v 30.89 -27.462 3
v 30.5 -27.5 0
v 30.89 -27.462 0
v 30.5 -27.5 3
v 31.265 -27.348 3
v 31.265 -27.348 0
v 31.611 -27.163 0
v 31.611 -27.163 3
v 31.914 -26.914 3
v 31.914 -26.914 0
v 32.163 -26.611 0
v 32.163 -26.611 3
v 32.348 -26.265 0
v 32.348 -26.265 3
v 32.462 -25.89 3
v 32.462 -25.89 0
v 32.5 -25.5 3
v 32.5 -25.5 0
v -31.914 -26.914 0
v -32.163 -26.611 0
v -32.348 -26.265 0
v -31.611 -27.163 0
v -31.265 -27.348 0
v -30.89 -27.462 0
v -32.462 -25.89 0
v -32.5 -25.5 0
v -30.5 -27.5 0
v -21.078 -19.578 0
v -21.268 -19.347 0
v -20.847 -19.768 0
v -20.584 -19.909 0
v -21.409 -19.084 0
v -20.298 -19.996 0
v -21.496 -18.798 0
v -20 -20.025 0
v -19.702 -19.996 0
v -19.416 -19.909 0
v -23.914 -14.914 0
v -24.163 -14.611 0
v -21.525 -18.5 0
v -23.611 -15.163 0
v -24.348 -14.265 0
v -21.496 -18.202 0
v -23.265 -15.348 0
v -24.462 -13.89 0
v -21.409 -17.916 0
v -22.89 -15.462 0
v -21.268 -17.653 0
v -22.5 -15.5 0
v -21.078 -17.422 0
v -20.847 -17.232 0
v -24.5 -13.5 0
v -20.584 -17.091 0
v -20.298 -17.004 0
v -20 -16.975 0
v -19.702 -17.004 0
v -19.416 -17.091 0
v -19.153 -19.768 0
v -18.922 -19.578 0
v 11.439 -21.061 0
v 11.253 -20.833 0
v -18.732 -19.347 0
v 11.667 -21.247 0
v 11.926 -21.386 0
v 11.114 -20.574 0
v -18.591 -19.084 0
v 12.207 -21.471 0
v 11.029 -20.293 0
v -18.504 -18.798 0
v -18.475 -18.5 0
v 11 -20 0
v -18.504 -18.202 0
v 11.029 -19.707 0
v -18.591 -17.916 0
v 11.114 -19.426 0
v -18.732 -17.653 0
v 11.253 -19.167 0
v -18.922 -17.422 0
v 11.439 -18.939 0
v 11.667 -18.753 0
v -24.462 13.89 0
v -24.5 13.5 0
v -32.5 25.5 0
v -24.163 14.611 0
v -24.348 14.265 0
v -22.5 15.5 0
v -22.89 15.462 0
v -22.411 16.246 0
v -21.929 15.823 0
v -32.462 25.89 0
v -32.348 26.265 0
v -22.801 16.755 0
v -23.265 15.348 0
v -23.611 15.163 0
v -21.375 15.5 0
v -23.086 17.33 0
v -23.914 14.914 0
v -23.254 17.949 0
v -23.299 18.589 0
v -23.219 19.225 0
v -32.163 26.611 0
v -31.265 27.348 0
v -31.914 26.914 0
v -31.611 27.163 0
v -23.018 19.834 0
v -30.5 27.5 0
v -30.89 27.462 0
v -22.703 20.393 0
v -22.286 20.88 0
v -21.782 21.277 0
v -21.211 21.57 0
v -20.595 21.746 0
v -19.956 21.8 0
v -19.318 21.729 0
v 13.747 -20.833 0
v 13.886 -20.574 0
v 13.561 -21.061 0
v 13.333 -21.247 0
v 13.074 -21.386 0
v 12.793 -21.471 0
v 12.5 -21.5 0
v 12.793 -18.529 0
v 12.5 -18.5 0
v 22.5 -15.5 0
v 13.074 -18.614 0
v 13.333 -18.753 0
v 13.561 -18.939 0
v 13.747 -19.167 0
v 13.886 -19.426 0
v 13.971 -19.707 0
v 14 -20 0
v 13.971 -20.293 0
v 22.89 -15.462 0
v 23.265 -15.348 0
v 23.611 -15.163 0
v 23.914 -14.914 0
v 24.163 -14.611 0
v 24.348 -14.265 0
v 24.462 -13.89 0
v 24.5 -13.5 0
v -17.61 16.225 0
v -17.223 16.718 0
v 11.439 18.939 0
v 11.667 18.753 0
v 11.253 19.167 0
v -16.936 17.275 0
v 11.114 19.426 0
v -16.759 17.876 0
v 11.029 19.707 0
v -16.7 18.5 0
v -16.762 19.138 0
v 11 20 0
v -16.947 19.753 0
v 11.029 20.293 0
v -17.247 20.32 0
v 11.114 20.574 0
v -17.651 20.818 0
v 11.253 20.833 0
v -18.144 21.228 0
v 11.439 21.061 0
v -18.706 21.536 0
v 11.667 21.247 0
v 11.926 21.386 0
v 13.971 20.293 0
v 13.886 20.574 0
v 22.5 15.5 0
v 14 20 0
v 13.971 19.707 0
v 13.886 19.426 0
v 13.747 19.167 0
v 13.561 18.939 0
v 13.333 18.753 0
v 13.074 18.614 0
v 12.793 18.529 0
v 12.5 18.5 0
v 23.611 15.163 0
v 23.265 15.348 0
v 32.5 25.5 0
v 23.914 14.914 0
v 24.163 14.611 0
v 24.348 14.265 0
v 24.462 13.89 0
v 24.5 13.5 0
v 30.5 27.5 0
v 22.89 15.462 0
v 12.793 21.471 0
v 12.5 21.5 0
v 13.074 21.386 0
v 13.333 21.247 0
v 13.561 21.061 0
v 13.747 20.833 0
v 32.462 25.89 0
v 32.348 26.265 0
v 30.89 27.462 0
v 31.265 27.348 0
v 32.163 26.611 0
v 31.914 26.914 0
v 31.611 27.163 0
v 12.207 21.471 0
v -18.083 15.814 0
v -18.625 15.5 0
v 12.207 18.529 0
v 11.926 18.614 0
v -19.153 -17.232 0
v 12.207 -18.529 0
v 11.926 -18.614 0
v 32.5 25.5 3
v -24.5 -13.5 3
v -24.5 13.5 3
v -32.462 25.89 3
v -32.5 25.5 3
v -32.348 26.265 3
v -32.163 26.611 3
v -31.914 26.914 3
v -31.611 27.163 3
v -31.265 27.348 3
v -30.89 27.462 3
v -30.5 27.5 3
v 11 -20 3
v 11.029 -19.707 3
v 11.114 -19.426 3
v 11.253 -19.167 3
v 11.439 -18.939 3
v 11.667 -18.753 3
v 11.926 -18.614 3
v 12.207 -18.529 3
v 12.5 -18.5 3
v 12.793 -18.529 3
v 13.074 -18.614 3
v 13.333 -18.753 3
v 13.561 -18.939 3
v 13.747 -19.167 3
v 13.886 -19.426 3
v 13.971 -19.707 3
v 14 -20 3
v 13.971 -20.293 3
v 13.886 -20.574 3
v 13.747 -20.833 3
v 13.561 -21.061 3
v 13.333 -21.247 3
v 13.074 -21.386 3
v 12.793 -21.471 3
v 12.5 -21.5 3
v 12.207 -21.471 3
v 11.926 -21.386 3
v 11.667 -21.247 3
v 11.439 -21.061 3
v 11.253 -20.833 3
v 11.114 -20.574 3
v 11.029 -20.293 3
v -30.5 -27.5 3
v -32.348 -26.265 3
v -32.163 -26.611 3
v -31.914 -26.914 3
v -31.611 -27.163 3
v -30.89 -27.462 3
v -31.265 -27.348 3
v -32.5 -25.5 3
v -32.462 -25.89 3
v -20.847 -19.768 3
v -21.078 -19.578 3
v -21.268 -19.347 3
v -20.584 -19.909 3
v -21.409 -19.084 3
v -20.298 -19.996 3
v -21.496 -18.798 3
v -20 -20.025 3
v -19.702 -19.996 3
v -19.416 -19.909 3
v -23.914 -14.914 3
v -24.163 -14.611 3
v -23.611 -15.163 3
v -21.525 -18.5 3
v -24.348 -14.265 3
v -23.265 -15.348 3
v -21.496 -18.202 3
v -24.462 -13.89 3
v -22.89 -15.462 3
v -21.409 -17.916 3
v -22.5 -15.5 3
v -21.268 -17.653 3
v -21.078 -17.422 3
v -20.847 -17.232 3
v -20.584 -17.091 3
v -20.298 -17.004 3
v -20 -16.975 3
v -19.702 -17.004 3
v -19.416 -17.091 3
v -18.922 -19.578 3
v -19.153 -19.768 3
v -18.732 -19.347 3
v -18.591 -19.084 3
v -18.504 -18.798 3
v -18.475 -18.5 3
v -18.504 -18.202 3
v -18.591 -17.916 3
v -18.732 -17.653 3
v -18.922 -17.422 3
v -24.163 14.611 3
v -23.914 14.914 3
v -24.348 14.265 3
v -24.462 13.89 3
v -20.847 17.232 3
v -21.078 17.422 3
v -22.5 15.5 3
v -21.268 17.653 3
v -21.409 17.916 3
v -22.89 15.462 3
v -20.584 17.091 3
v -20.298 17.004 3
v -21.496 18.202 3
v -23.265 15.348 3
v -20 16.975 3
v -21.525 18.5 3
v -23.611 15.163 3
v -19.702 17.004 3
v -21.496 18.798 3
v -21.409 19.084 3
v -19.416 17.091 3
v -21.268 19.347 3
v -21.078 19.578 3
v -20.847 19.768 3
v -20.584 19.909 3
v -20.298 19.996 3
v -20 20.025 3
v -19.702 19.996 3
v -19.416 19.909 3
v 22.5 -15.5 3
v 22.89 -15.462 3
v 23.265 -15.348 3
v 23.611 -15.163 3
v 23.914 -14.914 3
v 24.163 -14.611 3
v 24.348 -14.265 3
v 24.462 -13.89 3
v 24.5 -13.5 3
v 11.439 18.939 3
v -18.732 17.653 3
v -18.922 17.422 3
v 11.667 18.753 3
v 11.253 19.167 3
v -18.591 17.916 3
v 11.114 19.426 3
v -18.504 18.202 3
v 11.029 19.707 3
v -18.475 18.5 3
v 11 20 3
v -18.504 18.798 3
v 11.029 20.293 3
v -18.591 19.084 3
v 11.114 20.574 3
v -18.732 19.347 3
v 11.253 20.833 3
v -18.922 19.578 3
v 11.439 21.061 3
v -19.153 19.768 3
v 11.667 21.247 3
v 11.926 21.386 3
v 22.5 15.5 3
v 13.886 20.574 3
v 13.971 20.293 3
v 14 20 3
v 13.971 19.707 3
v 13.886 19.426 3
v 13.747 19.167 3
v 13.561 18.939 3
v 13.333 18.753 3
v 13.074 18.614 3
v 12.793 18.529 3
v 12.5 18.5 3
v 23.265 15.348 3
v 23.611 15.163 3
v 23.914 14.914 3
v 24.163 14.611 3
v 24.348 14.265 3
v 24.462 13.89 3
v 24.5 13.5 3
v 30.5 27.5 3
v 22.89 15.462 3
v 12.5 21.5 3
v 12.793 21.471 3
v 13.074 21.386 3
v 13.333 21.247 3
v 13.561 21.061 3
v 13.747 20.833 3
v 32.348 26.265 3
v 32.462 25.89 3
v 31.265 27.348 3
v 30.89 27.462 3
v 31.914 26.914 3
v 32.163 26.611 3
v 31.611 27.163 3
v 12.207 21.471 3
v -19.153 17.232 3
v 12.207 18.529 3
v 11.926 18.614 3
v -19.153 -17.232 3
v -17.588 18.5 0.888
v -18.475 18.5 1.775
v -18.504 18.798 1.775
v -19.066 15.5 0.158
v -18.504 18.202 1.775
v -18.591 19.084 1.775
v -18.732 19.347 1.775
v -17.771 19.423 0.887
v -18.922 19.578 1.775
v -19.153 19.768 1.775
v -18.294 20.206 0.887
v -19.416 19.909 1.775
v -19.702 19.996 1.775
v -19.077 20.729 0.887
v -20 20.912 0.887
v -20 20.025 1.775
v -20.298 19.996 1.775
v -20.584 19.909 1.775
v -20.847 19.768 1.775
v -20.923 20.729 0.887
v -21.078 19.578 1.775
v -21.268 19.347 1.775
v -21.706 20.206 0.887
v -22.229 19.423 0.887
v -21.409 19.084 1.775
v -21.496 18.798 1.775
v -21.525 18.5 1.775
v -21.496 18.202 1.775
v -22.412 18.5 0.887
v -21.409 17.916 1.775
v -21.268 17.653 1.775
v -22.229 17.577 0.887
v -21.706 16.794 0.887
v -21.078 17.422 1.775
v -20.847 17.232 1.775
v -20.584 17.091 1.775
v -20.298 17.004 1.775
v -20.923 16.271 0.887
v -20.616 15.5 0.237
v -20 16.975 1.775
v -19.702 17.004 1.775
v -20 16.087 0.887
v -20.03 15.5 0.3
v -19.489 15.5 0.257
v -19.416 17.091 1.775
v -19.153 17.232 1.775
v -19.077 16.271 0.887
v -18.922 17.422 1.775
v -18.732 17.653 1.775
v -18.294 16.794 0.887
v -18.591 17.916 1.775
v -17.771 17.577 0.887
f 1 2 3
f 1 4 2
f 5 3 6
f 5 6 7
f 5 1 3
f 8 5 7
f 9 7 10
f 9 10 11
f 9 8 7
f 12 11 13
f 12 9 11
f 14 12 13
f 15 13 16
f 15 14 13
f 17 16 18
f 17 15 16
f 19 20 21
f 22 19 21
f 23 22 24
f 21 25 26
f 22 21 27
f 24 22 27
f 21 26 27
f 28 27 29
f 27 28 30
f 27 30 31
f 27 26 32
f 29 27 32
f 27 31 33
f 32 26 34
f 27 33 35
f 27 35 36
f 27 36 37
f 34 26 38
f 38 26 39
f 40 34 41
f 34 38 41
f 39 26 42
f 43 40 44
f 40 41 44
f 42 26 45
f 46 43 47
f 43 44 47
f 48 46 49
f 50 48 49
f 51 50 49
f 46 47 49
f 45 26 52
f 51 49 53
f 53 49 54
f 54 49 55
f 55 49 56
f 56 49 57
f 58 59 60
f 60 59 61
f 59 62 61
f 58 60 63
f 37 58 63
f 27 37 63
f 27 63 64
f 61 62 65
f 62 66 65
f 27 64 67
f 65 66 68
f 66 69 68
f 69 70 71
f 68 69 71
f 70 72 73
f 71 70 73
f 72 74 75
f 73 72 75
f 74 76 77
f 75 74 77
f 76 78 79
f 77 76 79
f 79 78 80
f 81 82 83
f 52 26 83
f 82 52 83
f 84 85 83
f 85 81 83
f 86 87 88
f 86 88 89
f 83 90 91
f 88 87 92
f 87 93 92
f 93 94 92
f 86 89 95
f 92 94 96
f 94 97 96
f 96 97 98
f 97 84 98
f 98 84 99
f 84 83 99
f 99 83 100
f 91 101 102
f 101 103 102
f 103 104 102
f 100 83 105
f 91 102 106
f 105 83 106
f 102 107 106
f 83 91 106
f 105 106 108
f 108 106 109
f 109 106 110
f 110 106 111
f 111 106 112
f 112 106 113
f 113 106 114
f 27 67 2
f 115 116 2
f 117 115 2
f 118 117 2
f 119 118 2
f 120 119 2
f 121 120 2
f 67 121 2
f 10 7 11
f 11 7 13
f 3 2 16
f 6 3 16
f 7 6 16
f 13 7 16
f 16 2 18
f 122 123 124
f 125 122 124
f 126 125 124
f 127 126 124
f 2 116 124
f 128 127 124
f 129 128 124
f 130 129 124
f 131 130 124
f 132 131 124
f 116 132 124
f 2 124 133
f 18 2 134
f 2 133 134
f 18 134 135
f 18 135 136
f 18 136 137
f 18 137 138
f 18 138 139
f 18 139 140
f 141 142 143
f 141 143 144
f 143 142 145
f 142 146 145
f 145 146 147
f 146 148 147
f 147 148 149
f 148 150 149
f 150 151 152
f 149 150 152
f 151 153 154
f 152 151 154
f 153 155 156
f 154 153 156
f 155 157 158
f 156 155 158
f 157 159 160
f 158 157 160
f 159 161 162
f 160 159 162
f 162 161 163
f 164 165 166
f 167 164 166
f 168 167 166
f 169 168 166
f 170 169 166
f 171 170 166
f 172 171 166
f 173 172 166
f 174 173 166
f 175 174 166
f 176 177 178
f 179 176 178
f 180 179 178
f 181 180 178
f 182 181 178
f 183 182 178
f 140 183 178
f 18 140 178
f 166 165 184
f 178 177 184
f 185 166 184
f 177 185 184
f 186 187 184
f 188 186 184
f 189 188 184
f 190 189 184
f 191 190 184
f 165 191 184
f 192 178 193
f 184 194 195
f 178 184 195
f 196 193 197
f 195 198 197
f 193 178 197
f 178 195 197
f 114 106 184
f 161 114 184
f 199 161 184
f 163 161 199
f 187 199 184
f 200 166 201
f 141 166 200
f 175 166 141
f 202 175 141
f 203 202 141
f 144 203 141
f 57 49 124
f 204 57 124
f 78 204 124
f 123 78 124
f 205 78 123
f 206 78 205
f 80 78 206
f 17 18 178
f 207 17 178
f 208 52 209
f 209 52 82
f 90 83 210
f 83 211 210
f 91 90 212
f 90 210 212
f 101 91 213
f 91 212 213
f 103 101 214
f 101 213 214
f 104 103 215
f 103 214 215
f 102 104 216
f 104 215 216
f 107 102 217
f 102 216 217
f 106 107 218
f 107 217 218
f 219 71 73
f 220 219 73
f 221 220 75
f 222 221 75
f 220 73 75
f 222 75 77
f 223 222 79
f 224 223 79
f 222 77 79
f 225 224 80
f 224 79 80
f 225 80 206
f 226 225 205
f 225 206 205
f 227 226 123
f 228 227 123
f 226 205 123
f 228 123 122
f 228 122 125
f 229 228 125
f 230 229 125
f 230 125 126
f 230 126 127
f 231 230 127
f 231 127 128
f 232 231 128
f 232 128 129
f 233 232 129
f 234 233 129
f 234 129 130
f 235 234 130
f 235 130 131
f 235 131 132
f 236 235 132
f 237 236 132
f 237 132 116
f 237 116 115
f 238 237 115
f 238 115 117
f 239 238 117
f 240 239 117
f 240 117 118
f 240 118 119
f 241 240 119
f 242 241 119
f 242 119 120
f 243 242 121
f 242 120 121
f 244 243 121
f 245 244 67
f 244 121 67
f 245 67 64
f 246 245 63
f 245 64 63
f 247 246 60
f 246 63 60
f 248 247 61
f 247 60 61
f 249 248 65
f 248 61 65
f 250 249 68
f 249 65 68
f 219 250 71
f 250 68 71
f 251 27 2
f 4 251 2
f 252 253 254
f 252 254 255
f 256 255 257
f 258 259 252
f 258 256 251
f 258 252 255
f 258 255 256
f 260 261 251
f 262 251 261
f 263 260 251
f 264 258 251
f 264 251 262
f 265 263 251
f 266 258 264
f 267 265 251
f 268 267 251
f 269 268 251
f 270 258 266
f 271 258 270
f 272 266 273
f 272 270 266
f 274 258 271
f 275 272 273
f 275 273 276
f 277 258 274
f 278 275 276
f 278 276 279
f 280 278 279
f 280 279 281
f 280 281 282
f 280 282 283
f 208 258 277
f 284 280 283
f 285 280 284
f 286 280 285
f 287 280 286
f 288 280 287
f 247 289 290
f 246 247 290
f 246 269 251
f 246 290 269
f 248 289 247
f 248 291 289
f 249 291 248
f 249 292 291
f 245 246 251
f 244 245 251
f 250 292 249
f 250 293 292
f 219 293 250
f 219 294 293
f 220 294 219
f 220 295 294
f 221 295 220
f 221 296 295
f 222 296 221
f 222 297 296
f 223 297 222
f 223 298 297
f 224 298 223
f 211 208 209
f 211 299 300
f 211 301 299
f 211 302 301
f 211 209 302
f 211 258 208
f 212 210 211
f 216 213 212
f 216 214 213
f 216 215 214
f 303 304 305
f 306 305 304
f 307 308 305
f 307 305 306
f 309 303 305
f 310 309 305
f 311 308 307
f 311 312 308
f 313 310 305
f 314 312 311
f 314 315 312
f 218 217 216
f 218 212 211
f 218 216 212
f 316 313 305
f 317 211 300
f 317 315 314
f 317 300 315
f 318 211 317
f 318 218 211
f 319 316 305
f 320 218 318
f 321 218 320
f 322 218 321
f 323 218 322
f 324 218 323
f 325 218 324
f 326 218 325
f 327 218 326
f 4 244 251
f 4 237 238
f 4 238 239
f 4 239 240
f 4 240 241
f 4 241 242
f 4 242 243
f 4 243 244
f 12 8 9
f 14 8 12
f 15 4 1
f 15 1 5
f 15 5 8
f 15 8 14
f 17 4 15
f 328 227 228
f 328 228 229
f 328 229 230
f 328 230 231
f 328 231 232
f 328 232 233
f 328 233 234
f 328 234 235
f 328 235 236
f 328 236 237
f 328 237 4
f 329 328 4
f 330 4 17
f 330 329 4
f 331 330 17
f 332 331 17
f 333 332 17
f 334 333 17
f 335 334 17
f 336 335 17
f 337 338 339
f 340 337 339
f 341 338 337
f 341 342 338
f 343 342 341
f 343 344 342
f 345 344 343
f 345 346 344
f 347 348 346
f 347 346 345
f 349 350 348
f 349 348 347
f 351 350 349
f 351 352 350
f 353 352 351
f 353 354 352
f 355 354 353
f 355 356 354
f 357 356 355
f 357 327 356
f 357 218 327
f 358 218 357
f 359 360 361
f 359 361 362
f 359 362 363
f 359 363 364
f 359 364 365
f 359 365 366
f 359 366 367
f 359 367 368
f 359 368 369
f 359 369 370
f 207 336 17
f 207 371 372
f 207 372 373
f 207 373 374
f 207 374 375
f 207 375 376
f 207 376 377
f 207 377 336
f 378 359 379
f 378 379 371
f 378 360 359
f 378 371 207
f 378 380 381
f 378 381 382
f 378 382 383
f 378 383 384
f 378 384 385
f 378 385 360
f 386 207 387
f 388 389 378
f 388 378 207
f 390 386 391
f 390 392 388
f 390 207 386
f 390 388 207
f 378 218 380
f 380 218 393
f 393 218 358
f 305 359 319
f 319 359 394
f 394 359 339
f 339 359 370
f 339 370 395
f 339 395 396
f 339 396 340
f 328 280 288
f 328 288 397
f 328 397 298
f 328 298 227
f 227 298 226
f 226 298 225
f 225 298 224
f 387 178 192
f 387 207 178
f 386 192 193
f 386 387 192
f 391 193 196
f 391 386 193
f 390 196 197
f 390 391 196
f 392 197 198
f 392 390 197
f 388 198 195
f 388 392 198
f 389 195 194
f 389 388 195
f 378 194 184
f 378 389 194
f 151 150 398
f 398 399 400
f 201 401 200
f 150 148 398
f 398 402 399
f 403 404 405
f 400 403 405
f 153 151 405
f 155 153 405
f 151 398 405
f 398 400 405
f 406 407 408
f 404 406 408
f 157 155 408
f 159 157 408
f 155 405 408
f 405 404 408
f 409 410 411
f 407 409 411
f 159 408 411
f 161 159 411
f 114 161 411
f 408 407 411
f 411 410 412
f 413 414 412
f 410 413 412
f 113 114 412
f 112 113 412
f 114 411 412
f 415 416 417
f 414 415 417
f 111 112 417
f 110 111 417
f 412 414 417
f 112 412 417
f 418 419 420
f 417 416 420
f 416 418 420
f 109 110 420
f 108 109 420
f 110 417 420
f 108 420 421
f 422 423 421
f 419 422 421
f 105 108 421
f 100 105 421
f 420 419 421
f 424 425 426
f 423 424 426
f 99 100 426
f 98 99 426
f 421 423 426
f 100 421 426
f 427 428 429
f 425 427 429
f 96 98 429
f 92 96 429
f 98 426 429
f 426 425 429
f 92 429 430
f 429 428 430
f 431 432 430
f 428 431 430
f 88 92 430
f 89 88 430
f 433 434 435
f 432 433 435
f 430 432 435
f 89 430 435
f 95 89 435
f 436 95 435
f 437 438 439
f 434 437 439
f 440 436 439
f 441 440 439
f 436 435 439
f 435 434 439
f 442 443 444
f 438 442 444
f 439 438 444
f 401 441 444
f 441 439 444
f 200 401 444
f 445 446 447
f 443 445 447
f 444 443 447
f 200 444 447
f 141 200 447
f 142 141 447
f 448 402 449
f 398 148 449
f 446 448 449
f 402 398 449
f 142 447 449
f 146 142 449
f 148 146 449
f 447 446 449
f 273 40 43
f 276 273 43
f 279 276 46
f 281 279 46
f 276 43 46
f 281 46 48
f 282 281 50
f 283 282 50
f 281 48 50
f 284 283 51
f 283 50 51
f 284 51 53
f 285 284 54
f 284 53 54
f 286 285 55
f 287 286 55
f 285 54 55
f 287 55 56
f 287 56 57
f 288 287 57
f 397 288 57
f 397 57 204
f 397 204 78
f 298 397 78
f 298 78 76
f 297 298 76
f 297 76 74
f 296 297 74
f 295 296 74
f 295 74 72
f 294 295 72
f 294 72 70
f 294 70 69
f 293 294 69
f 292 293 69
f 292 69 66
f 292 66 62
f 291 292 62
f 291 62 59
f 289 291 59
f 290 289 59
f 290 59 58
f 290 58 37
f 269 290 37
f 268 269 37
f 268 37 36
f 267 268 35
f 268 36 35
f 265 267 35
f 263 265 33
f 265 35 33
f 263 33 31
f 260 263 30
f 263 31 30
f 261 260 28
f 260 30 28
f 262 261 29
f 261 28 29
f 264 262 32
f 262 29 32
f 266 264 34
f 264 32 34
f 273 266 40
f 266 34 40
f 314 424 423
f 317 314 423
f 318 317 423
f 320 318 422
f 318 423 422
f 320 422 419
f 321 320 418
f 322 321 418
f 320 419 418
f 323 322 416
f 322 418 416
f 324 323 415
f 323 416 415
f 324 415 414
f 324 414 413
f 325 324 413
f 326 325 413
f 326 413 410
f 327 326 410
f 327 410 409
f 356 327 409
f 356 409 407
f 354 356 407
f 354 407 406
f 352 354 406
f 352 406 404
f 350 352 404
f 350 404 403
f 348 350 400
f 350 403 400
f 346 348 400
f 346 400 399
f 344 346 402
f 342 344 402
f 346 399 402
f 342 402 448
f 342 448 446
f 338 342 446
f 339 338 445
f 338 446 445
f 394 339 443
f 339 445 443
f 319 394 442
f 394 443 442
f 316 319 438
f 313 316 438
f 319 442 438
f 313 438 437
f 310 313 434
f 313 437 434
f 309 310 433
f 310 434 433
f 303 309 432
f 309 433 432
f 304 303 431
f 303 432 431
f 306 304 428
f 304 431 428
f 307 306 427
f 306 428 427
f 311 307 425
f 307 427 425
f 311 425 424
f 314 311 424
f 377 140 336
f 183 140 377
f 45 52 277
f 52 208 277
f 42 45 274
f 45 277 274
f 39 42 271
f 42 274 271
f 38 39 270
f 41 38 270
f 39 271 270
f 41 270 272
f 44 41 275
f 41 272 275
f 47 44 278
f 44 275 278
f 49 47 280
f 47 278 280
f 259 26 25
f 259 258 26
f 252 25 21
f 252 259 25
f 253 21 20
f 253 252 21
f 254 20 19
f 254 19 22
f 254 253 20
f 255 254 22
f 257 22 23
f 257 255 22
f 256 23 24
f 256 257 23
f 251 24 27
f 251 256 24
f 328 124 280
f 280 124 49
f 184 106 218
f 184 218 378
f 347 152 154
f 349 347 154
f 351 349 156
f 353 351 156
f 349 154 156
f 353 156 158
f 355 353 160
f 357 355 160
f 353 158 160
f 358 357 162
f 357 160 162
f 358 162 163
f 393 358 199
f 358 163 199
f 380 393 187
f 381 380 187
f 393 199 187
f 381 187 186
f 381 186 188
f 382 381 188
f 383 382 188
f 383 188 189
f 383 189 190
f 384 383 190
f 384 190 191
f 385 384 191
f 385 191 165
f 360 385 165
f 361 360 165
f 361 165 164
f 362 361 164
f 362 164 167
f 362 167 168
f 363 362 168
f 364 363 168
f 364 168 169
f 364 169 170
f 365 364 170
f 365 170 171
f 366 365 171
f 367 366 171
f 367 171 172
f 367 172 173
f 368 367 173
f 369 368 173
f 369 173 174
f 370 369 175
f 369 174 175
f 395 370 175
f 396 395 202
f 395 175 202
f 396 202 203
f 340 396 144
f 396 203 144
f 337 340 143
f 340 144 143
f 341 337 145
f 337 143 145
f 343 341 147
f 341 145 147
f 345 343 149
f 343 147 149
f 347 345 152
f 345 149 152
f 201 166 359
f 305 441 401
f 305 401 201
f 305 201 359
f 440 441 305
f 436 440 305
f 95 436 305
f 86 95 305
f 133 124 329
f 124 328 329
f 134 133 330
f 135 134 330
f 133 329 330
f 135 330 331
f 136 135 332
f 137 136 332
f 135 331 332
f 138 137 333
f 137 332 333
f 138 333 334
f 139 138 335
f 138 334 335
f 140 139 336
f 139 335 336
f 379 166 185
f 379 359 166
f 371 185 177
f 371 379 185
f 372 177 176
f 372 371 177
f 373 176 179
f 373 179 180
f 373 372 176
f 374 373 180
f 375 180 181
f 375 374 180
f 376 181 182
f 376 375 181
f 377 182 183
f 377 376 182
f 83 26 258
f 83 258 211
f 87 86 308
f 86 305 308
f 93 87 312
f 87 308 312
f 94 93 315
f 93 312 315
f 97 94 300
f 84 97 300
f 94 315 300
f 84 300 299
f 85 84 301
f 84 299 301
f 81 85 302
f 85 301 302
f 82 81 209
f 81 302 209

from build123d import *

# Parameters (mm, degrees)
SKETCH_1_W                   = 65
SKETCH_1_H                   = 55
EXTRUDE_1_DEPTH              = 3
FILLET_1_R                   = 2
SKETCH_2_R                   = 1.525
CUT_EXTRUDE_1_DEPTH          = 6
HOLE_WIZARD_M3_1_D           = 3
HOLE_WIZARD_M3_1_DEPTH       = 7.25
HOLE_WIZARD_M3_1_CSINK_D     = 6.6
HOLE_WIZARD_M3_1_CSINK_ANGLE = 90
HOLE_WIZARD_M3_1_TIP         = 0.901290929
SKETCH_9_R                   = 1.5
CUT_EXTRUDE_3_DEPTH          = 10
SKETCH_13_W                  = 49
SKETCH_13_H                  = 31
CUT_EXTRUDE_8_DEPTH          = 10
FILLET_5_R                   = 2


with BuildPart() as part:
    # 草图1 → 凸台-拉伸1 (new body)
    with BuildSketch(Plane.XY):
        Rectangle(SKETCH_1_W, SKETCH_1_H)
    extrude(amount=EXTRUDE_1_DEPTH)

    # 圆角1
    fillet_1_edges = [part.edges().sort_by_distance(p)[0] for p in [
        (32.5, -27.5, 1.5),
        (-32.5, -27.5, 1.5),
        (-32.5, 27.5, 1.5),
        (32.5, 27.5, 1.5),
    ]]
    fillet(fillet_1_edges, radius=FILLET_1_R)

    # 草图2 → 切除-拉伸1 (cut)
    with BuildSketch(Plane(origin=(0, 0, 0), x_dir=(-1, 0, 0), z_dir=(0, 0, -1))):
        with Locations((20, -18.5)):
            Circle(SKETCH_2_R)
        with Locations((20, 18.5)):
            Circle(SKETCH_2_R)
    extrude(amount=-CUT_EXTRUDE_1_DEPTH, mode=Mode.SUBTRACT)

    # M3 十字槽沉头木螺钉的锥形沉头孔1
    with Locations(Plane(origin=(0, 0, 0), x_dir=(-1, 0, 0), z_dir=(0, 0, -1))):
        with Locations((20, 18.5)):
            CounterSinkHole(HOLE_WIZARD_M3_1_D / 2, HOLE_WIZARD_M3_1_CSINK_D / 2, depth=HOLE_WIZARD_M3_1_DEPTH, counter_sink_angle=HOLE_WIZARD_M3_1_CSINK_ANGLE)
            with Locations((0, 0, -(HOLE_WIZARD_M3_1_DEPTH + HOLE_WIZARD_M3_1_TIP / 2))):  # 118° drill point
                Cone(0, HOLE_WIZARD_M3_1_D / 2, HOLE_WIZARD_M3_1_TIP, mode=Mode.SUBTRACT)

    # 草图9 → 切除-拉伸3 (cut)
    with BuildSketch(Plane(origin=(0, 0, 0), x_dir=(-1, 0, 0), z_dir=(0, 0, -1))):
        with Locations((-12.5, 20)):
            Circle(SKETCH_9_R)
        with Locations((-12.5, -20)):
            Circle(SKETCH_9_R)
    extrude(amount=-CUT_EXTRUDE_3_DEPTH, mode=Mode.SUBTRACT)

    # 草图13 → 切除-拉伸8 (cut)
    with BuildSketch(Plane(origin=(0, 0, 0), x_dir=(-1, 0, 0), z_dir=(0, 0, -1))):
        Rectangle(SKETCH_13_W, SKETCH_13_H)
    extrude(amount=-CUT_EXTRUDE_8_DEPTH, mode=Mode.SUBTRACT)

    # 圆角5
    fillet_5_edges = [part.edges().sort_by_distance(p)[0] for p in [
        (-24.5, 15.5, 1.5),
        (-24.5, -15.5, 1.5),
        (24.5, -15.5, 1.5),
        (24.5, 15.5, 1.5),
    ]]
    fillet(fillet_5_edges, radius=FILLET_5_R)


solid = part.part
